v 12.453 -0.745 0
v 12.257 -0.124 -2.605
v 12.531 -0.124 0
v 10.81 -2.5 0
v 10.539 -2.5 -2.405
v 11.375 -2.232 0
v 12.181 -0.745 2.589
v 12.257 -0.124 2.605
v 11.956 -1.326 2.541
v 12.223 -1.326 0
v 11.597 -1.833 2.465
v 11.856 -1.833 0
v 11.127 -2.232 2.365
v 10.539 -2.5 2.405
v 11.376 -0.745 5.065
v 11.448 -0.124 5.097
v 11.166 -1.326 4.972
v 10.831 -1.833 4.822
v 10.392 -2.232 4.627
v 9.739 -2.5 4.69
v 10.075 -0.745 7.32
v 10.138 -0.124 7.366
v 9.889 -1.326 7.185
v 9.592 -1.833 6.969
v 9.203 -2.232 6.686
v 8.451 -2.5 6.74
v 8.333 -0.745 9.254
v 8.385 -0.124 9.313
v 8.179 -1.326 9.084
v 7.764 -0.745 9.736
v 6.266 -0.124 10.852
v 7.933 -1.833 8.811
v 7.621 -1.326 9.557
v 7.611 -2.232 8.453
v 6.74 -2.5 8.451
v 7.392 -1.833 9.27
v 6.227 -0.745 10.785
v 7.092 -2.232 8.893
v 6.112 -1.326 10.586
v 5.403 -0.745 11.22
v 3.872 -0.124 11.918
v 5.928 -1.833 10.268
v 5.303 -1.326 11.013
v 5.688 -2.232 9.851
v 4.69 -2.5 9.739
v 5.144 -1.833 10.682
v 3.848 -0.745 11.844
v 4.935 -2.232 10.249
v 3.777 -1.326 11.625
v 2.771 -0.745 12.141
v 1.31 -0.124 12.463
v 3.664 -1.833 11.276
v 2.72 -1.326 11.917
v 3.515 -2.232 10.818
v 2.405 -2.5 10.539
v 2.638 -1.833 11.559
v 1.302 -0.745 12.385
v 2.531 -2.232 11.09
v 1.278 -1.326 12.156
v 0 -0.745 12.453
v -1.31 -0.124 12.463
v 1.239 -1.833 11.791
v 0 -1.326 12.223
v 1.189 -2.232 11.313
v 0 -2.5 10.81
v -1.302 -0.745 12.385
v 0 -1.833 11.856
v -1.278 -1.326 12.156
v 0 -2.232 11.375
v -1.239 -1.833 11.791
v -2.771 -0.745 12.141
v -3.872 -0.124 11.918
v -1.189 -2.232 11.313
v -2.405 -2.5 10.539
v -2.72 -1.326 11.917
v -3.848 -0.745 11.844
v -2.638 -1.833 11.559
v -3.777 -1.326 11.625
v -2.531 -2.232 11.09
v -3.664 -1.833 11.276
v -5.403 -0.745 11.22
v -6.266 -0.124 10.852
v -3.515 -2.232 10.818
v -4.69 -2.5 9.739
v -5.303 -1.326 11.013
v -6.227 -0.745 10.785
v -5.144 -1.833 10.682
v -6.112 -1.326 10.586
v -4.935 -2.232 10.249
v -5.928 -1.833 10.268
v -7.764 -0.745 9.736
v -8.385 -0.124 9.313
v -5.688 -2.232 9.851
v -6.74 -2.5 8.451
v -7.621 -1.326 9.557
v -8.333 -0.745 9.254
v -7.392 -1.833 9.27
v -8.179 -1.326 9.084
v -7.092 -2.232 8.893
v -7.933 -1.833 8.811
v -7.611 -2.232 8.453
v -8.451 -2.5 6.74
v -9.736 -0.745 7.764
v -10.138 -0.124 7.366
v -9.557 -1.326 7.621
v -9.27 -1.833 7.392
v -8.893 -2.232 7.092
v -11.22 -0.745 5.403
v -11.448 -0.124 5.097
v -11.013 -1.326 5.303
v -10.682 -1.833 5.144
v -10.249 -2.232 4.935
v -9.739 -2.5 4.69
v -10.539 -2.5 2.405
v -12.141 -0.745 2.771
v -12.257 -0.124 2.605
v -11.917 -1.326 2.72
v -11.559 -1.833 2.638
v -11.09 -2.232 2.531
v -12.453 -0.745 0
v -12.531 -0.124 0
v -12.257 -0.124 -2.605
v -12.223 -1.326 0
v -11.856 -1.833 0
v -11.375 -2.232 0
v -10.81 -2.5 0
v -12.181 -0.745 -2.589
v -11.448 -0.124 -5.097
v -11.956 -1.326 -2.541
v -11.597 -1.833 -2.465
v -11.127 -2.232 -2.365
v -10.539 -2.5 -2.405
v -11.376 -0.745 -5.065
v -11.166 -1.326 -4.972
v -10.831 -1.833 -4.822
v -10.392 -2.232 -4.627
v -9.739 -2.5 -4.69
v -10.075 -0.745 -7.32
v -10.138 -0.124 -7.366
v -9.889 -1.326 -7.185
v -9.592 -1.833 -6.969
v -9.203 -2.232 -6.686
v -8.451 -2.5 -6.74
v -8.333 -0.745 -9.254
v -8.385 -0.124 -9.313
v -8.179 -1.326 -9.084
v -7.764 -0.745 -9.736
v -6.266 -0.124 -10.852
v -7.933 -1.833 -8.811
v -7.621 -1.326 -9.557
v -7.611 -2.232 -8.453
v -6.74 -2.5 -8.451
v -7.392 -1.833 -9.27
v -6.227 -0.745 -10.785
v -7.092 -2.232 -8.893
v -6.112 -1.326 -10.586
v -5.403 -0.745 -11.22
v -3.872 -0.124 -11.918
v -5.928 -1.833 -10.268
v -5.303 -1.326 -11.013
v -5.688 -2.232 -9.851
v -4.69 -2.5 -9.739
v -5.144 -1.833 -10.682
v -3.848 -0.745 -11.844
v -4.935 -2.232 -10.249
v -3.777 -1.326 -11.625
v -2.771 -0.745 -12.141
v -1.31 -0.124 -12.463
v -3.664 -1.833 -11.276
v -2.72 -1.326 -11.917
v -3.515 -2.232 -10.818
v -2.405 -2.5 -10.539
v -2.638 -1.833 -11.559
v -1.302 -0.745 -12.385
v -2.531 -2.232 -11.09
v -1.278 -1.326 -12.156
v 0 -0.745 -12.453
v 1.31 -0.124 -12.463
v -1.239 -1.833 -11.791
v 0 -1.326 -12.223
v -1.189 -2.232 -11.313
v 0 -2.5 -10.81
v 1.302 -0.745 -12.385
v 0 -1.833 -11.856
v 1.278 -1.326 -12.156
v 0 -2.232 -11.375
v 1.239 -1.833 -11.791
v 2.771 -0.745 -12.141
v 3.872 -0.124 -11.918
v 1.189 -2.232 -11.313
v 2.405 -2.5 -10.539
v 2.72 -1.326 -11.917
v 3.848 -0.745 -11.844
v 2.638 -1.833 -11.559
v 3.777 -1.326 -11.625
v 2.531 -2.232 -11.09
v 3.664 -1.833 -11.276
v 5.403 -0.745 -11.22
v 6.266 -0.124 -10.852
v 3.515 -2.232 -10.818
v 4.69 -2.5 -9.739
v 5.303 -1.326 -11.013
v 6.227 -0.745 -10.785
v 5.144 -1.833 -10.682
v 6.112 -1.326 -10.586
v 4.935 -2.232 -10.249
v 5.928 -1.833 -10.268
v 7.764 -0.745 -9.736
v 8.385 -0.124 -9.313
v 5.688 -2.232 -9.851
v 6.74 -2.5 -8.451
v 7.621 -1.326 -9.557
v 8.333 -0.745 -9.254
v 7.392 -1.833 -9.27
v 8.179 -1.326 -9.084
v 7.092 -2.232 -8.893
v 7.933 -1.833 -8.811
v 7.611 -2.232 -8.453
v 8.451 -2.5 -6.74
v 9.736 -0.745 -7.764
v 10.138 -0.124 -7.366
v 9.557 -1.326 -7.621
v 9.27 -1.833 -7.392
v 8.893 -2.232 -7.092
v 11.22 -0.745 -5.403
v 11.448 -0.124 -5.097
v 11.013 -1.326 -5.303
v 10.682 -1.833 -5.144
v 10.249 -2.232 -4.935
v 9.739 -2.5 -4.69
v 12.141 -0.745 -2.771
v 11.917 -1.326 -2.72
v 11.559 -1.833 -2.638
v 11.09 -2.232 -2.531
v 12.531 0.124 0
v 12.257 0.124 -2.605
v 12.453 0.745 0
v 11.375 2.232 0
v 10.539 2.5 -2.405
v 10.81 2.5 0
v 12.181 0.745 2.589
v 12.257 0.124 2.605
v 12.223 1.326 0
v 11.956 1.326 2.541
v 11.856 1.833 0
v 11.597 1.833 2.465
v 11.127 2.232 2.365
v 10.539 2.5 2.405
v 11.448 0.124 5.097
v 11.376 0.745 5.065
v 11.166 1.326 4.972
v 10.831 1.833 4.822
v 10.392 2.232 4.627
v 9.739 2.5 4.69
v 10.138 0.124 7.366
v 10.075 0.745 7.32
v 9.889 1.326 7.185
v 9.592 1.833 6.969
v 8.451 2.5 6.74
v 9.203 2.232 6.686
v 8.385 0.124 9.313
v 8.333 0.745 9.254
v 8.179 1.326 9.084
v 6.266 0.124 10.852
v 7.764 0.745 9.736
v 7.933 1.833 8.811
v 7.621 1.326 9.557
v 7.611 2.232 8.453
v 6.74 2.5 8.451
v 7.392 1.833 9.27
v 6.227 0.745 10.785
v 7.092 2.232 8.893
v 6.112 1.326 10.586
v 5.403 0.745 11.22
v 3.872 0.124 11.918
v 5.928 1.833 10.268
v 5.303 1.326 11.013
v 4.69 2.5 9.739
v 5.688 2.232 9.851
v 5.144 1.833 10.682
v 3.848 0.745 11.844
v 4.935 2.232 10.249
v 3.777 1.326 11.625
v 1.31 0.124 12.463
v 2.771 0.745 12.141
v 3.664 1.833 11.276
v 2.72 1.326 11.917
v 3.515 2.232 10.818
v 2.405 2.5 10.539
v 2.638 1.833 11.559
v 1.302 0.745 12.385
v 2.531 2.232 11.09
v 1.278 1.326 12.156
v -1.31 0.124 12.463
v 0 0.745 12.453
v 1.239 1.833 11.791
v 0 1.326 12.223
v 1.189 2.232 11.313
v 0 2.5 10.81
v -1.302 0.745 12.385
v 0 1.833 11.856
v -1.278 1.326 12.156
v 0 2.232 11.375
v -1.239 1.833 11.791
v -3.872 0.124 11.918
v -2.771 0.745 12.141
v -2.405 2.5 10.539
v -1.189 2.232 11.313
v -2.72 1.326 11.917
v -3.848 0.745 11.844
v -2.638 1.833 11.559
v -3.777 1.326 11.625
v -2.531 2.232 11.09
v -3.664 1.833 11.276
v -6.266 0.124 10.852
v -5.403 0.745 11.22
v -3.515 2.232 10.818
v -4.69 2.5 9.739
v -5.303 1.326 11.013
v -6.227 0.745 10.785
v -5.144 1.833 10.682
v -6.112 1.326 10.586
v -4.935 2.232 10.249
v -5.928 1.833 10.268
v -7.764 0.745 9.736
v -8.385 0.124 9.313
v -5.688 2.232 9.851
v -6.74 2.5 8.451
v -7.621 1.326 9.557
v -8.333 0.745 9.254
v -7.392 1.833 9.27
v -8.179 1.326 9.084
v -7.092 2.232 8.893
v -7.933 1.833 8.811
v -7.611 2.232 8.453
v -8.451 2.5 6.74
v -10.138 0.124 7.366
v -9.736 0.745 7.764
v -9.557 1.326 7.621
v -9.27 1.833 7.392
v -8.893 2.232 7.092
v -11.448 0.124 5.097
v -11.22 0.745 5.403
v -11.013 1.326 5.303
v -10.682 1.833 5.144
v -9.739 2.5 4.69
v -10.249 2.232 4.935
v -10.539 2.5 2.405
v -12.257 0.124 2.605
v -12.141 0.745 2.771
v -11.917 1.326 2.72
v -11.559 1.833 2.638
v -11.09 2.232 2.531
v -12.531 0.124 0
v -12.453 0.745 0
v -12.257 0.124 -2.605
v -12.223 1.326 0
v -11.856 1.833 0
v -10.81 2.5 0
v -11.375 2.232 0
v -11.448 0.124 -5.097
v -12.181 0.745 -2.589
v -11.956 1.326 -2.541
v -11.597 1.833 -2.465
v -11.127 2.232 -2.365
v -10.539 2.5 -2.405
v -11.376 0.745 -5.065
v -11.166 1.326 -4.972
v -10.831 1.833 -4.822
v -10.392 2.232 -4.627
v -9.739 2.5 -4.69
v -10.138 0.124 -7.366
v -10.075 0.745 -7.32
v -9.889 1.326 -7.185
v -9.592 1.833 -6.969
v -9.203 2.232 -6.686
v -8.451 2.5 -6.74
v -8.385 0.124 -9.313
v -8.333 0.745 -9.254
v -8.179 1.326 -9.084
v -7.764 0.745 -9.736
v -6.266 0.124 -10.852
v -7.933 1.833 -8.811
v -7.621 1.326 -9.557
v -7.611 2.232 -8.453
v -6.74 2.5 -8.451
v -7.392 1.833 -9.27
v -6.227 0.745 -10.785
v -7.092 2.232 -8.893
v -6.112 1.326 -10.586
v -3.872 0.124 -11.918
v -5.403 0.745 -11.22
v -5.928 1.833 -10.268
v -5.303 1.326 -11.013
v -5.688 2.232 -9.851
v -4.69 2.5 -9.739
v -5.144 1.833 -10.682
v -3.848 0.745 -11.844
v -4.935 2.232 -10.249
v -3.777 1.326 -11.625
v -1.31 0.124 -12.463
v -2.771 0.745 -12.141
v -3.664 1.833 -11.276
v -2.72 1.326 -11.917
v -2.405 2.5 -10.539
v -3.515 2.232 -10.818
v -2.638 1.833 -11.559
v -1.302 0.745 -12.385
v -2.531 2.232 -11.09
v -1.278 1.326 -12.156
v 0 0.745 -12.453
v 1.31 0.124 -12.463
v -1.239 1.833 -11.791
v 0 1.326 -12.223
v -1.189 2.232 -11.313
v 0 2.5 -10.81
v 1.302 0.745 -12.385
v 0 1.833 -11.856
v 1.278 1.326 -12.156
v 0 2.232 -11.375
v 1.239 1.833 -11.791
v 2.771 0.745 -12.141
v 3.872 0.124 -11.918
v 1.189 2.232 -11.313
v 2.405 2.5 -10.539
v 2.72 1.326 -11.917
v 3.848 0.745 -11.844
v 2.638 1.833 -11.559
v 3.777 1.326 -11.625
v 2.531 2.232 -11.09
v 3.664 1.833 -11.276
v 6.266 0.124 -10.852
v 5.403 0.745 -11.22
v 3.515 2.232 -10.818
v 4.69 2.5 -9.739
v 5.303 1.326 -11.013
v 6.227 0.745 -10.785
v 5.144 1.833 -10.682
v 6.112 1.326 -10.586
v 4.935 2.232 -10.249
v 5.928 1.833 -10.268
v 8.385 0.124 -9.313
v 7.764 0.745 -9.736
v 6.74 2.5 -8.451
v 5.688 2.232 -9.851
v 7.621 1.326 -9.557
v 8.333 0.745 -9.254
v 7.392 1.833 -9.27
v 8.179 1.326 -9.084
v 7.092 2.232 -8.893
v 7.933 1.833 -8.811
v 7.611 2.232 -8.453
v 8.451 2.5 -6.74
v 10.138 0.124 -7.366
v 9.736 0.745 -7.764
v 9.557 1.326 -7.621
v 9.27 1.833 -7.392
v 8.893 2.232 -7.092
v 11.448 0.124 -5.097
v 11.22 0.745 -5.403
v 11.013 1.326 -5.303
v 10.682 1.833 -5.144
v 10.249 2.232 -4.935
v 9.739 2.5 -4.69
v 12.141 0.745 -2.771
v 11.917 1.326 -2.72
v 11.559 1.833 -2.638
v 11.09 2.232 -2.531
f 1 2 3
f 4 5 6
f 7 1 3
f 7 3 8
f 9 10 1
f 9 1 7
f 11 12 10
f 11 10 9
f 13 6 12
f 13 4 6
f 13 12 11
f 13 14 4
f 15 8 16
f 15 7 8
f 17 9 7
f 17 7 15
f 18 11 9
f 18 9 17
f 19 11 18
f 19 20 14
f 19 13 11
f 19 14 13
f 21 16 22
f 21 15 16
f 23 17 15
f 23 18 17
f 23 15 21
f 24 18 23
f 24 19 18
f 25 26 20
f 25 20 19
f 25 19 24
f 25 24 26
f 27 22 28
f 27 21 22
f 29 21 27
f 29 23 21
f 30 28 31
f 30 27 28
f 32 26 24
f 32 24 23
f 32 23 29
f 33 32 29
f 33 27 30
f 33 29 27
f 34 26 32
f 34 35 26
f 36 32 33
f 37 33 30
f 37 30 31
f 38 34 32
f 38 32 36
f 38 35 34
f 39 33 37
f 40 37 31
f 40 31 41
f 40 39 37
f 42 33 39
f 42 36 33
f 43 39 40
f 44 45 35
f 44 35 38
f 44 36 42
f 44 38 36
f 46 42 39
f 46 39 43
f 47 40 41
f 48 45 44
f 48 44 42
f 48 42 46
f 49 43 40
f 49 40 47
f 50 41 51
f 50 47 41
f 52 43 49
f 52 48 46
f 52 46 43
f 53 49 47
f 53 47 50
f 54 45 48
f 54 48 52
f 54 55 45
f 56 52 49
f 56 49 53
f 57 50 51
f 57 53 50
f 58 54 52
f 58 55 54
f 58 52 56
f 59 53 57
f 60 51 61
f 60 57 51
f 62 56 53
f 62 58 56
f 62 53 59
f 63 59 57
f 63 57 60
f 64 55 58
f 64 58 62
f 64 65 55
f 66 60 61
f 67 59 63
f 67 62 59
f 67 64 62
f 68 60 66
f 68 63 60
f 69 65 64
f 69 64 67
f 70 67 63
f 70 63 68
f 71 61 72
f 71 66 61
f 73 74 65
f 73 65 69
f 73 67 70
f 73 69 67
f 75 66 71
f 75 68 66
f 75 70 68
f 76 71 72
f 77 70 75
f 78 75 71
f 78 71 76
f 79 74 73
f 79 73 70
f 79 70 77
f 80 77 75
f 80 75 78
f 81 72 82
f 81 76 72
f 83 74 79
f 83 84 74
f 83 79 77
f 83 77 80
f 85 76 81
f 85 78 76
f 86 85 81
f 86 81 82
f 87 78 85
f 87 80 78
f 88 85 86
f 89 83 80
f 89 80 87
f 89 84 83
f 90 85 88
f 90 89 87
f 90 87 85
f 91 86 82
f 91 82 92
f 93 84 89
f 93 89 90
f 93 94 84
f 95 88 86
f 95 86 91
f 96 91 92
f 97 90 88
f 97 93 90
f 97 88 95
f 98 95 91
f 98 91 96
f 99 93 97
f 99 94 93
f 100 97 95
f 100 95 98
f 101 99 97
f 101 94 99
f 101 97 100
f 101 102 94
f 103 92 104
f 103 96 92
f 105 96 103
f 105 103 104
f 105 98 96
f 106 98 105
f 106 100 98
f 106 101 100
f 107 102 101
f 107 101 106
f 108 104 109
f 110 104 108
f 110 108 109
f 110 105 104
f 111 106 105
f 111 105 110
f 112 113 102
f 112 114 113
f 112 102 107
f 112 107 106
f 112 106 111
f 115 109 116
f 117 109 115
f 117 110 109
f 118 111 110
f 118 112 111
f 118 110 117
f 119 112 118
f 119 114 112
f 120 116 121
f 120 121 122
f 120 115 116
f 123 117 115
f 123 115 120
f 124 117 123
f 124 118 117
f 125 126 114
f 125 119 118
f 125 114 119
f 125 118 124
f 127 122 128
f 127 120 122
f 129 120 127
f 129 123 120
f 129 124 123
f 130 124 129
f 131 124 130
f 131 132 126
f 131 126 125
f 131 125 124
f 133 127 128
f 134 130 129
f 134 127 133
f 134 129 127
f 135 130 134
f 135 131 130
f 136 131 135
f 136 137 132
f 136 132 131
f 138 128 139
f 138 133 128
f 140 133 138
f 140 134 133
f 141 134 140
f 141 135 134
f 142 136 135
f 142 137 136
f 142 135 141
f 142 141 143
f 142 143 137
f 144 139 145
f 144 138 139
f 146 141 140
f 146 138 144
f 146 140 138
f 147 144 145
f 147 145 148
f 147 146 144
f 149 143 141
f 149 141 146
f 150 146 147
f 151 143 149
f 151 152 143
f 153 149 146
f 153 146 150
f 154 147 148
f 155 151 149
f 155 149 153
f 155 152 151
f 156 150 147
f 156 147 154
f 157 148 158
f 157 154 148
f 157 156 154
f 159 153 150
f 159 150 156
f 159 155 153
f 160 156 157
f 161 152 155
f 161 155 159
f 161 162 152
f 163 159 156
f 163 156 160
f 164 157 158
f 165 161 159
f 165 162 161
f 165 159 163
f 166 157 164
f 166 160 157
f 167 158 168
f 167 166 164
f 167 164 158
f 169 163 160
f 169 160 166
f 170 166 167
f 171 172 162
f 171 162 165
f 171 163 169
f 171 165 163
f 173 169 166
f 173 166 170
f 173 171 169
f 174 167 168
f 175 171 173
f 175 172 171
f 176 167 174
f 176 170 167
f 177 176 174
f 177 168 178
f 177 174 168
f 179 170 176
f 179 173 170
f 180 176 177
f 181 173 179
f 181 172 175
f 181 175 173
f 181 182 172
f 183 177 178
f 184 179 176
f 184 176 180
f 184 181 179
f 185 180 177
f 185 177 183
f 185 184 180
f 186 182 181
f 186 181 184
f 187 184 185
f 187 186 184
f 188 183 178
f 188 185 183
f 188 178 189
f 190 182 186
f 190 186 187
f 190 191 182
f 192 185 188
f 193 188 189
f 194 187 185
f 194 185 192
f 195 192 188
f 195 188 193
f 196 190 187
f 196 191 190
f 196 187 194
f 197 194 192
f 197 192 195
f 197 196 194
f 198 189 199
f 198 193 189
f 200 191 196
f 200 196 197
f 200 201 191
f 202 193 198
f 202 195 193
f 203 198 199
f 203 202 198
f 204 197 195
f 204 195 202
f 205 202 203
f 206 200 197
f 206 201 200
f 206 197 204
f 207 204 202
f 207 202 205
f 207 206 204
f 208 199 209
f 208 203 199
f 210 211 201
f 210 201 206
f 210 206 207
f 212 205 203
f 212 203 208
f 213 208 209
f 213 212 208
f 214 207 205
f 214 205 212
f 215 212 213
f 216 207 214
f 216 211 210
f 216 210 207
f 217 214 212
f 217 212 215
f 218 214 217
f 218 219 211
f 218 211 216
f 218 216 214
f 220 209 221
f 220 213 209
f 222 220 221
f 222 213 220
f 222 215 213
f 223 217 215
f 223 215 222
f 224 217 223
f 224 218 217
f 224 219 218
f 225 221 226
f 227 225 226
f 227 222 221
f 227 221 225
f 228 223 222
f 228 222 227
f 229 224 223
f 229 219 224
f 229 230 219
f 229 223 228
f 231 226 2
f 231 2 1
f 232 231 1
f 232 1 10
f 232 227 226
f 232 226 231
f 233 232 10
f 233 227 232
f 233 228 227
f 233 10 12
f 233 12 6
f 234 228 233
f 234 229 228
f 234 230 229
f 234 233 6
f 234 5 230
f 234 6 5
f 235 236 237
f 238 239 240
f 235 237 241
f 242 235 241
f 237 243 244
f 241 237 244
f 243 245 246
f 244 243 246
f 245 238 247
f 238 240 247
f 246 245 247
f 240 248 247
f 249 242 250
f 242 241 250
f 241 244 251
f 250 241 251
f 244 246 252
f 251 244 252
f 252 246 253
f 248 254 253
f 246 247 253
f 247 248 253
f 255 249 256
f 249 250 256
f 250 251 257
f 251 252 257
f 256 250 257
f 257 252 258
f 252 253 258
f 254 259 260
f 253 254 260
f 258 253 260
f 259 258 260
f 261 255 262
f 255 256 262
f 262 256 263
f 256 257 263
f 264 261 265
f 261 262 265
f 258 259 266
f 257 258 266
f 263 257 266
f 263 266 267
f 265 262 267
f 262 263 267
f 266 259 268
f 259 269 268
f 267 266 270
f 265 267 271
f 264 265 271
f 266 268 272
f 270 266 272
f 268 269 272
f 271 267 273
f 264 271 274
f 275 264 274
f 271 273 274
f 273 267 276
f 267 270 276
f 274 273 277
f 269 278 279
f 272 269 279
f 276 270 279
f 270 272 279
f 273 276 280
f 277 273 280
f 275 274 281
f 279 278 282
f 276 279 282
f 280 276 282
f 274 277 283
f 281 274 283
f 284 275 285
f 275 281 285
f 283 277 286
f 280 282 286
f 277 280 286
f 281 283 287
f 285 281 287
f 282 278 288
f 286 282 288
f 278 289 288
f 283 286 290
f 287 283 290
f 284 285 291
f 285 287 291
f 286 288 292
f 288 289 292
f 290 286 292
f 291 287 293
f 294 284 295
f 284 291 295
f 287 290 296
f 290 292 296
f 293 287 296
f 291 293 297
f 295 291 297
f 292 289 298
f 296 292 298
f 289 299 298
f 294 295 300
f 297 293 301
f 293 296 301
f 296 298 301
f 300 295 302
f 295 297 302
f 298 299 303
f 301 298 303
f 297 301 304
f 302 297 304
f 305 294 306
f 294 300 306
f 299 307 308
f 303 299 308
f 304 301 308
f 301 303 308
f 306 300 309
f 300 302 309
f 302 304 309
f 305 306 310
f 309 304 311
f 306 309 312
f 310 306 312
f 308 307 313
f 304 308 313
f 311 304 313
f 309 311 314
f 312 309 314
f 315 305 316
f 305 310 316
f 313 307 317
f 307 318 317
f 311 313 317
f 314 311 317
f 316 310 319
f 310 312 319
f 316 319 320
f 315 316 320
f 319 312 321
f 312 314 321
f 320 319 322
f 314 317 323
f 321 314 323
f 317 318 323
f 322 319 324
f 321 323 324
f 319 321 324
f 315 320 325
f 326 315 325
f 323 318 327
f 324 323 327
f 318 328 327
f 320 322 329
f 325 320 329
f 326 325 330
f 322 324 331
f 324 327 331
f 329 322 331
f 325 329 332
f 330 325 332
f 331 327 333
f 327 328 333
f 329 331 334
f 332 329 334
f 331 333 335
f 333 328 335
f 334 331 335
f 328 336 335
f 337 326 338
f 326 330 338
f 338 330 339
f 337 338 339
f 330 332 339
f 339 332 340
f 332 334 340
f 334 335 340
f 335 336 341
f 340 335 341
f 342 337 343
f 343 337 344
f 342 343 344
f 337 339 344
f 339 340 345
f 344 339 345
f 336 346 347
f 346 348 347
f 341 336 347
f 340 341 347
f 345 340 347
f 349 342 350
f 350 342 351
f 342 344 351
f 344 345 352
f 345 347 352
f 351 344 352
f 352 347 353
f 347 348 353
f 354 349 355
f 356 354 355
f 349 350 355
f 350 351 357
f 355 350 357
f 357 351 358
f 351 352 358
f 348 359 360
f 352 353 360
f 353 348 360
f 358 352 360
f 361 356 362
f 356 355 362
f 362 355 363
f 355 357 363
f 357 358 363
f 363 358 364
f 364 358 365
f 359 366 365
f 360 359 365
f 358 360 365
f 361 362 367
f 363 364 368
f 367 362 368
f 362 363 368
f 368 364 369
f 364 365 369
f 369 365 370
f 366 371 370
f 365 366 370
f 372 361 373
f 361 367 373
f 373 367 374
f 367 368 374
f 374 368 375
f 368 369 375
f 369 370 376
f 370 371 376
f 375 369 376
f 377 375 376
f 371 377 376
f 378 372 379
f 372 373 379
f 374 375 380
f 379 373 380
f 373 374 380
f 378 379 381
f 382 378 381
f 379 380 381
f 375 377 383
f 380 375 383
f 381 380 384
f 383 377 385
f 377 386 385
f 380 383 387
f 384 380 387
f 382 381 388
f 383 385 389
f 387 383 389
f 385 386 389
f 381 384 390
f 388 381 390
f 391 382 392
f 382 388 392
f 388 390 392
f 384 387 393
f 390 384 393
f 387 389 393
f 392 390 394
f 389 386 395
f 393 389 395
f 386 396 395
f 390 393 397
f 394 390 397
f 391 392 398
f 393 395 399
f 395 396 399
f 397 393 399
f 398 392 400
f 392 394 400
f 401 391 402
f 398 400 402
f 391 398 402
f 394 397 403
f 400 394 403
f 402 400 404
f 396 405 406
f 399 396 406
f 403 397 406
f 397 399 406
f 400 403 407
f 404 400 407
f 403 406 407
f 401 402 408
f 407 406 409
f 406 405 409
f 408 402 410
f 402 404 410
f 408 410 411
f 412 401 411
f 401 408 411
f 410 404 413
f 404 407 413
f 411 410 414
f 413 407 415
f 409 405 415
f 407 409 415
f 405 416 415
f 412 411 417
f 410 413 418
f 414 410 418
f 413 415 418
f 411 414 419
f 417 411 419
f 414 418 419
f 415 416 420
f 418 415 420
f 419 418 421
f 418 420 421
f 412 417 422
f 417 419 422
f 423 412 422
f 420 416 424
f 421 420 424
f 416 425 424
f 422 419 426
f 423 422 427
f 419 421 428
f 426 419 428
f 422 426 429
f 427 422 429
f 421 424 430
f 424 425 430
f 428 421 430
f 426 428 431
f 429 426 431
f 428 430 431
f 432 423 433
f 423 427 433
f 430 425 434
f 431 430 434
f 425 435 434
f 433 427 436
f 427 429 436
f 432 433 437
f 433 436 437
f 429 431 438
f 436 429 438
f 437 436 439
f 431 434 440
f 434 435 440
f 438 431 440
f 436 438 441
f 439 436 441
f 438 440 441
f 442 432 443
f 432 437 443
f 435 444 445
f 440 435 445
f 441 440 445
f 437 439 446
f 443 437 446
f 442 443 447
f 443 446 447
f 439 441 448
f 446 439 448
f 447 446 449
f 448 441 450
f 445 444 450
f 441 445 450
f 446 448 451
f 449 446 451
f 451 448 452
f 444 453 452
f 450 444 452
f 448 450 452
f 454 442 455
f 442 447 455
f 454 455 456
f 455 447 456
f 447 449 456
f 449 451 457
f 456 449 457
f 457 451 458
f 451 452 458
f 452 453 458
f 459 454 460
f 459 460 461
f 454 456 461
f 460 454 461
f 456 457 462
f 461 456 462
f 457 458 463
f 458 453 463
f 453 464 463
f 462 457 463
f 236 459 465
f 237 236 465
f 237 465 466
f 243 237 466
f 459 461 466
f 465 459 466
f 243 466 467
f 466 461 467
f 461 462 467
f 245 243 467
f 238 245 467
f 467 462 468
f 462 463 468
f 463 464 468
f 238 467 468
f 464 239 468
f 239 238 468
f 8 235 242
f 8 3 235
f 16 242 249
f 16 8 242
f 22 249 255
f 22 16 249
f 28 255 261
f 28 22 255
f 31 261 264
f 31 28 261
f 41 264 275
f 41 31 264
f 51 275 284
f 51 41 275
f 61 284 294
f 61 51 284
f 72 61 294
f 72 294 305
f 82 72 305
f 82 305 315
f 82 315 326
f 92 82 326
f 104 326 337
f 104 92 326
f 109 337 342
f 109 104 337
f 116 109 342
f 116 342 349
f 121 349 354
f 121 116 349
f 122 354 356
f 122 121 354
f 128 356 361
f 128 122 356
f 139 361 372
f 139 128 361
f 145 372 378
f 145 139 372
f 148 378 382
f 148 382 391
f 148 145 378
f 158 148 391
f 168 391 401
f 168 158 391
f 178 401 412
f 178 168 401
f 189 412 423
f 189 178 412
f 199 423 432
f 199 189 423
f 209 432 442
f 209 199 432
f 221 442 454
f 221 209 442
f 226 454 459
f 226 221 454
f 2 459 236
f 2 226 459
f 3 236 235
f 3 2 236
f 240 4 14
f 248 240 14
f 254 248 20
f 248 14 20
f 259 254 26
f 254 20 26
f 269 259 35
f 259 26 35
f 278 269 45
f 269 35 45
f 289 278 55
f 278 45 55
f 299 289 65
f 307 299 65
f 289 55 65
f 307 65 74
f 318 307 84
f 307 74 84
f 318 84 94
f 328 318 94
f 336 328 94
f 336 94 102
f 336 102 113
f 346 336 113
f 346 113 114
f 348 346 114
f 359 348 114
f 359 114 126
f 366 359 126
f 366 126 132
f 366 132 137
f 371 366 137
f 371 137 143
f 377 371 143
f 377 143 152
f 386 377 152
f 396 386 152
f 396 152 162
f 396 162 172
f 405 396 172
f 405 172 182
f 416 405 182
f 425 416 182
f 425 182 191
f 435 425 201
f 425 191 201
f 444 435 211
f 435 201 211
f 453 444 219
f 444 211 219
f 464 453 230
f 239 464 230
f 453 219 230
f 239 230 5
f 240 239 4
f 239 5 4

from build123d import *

# Parameters (mm, degrees)
F0_R     = 12.5312471482
F1_DEPTH = 2.5
F2_R     = 10.8098139949
F3_DEPTH = 75.98543


# Not quite as in the source:
# - a fillet or chamfer that OpenCascade refuses, or shapes differently, is made with other operations: its cross-section is extruded or revolved along the edge and cut away or added


with BuildPart() as f1:
    # F0 (on Front) → F1 (new body, symmetric)
    with BuildSketch(Plane.XZ):
        Circle(F0_R)
    extrude(amount=F1_DEPTH, both=True)

    # F2 (on face) → F3 (cut)
    with BuildSketch(Plane.XZ.offset(2.5)):
        Circle(F2_R)
    extrude(amount=-F3_DEPTH, mode=Mode.SUBTRACT)

    # F4: fillet of radius 2.5 on 1 edges, made by hand

    # F4_s1 → F4_t2 (revolve, cut)
    with BuildSketch(Plane.XY):
        with BuildLine():
            ThreePointArc((12.5312471482, -0.1243245876), (12.055650408, -1.5912231668), (10.8098139949, -2.5))
            Line((10.8098139949, -2.5), (12.5312471482, -2.5))
            Line((12.5312471482, -2.5), (12.5312471482, -0.1243245876))
        make_face()
    revolve(axis=Axis((0, -2.5, 0), (0, -1, 0)), mode=Mode.SUBTRACT)

    # F5: fillet of radius 2.5 on 1 edges, made by hand

    # F5_s1 → F5_t2 (revolve, cut)
    with BuildSketch(Plane.XY):
        with BuildLine():
            ThreePointArc((12.5312471482, 0.1243245876), (12.055650408, 1.5912231668), (10.8098139949, 2.5))
            Line((10.8098139949, 2.5), (12.5312471482, 2.5))
            Line((12.5312471482, 2.5), (12.5312471482, 0.1243245876))
        make_face()
    revolve(axis=Axis((0, 2.5, 0), (0, -1, 0)), mode=Mode.SUBTRACT)


solid = f1.part
